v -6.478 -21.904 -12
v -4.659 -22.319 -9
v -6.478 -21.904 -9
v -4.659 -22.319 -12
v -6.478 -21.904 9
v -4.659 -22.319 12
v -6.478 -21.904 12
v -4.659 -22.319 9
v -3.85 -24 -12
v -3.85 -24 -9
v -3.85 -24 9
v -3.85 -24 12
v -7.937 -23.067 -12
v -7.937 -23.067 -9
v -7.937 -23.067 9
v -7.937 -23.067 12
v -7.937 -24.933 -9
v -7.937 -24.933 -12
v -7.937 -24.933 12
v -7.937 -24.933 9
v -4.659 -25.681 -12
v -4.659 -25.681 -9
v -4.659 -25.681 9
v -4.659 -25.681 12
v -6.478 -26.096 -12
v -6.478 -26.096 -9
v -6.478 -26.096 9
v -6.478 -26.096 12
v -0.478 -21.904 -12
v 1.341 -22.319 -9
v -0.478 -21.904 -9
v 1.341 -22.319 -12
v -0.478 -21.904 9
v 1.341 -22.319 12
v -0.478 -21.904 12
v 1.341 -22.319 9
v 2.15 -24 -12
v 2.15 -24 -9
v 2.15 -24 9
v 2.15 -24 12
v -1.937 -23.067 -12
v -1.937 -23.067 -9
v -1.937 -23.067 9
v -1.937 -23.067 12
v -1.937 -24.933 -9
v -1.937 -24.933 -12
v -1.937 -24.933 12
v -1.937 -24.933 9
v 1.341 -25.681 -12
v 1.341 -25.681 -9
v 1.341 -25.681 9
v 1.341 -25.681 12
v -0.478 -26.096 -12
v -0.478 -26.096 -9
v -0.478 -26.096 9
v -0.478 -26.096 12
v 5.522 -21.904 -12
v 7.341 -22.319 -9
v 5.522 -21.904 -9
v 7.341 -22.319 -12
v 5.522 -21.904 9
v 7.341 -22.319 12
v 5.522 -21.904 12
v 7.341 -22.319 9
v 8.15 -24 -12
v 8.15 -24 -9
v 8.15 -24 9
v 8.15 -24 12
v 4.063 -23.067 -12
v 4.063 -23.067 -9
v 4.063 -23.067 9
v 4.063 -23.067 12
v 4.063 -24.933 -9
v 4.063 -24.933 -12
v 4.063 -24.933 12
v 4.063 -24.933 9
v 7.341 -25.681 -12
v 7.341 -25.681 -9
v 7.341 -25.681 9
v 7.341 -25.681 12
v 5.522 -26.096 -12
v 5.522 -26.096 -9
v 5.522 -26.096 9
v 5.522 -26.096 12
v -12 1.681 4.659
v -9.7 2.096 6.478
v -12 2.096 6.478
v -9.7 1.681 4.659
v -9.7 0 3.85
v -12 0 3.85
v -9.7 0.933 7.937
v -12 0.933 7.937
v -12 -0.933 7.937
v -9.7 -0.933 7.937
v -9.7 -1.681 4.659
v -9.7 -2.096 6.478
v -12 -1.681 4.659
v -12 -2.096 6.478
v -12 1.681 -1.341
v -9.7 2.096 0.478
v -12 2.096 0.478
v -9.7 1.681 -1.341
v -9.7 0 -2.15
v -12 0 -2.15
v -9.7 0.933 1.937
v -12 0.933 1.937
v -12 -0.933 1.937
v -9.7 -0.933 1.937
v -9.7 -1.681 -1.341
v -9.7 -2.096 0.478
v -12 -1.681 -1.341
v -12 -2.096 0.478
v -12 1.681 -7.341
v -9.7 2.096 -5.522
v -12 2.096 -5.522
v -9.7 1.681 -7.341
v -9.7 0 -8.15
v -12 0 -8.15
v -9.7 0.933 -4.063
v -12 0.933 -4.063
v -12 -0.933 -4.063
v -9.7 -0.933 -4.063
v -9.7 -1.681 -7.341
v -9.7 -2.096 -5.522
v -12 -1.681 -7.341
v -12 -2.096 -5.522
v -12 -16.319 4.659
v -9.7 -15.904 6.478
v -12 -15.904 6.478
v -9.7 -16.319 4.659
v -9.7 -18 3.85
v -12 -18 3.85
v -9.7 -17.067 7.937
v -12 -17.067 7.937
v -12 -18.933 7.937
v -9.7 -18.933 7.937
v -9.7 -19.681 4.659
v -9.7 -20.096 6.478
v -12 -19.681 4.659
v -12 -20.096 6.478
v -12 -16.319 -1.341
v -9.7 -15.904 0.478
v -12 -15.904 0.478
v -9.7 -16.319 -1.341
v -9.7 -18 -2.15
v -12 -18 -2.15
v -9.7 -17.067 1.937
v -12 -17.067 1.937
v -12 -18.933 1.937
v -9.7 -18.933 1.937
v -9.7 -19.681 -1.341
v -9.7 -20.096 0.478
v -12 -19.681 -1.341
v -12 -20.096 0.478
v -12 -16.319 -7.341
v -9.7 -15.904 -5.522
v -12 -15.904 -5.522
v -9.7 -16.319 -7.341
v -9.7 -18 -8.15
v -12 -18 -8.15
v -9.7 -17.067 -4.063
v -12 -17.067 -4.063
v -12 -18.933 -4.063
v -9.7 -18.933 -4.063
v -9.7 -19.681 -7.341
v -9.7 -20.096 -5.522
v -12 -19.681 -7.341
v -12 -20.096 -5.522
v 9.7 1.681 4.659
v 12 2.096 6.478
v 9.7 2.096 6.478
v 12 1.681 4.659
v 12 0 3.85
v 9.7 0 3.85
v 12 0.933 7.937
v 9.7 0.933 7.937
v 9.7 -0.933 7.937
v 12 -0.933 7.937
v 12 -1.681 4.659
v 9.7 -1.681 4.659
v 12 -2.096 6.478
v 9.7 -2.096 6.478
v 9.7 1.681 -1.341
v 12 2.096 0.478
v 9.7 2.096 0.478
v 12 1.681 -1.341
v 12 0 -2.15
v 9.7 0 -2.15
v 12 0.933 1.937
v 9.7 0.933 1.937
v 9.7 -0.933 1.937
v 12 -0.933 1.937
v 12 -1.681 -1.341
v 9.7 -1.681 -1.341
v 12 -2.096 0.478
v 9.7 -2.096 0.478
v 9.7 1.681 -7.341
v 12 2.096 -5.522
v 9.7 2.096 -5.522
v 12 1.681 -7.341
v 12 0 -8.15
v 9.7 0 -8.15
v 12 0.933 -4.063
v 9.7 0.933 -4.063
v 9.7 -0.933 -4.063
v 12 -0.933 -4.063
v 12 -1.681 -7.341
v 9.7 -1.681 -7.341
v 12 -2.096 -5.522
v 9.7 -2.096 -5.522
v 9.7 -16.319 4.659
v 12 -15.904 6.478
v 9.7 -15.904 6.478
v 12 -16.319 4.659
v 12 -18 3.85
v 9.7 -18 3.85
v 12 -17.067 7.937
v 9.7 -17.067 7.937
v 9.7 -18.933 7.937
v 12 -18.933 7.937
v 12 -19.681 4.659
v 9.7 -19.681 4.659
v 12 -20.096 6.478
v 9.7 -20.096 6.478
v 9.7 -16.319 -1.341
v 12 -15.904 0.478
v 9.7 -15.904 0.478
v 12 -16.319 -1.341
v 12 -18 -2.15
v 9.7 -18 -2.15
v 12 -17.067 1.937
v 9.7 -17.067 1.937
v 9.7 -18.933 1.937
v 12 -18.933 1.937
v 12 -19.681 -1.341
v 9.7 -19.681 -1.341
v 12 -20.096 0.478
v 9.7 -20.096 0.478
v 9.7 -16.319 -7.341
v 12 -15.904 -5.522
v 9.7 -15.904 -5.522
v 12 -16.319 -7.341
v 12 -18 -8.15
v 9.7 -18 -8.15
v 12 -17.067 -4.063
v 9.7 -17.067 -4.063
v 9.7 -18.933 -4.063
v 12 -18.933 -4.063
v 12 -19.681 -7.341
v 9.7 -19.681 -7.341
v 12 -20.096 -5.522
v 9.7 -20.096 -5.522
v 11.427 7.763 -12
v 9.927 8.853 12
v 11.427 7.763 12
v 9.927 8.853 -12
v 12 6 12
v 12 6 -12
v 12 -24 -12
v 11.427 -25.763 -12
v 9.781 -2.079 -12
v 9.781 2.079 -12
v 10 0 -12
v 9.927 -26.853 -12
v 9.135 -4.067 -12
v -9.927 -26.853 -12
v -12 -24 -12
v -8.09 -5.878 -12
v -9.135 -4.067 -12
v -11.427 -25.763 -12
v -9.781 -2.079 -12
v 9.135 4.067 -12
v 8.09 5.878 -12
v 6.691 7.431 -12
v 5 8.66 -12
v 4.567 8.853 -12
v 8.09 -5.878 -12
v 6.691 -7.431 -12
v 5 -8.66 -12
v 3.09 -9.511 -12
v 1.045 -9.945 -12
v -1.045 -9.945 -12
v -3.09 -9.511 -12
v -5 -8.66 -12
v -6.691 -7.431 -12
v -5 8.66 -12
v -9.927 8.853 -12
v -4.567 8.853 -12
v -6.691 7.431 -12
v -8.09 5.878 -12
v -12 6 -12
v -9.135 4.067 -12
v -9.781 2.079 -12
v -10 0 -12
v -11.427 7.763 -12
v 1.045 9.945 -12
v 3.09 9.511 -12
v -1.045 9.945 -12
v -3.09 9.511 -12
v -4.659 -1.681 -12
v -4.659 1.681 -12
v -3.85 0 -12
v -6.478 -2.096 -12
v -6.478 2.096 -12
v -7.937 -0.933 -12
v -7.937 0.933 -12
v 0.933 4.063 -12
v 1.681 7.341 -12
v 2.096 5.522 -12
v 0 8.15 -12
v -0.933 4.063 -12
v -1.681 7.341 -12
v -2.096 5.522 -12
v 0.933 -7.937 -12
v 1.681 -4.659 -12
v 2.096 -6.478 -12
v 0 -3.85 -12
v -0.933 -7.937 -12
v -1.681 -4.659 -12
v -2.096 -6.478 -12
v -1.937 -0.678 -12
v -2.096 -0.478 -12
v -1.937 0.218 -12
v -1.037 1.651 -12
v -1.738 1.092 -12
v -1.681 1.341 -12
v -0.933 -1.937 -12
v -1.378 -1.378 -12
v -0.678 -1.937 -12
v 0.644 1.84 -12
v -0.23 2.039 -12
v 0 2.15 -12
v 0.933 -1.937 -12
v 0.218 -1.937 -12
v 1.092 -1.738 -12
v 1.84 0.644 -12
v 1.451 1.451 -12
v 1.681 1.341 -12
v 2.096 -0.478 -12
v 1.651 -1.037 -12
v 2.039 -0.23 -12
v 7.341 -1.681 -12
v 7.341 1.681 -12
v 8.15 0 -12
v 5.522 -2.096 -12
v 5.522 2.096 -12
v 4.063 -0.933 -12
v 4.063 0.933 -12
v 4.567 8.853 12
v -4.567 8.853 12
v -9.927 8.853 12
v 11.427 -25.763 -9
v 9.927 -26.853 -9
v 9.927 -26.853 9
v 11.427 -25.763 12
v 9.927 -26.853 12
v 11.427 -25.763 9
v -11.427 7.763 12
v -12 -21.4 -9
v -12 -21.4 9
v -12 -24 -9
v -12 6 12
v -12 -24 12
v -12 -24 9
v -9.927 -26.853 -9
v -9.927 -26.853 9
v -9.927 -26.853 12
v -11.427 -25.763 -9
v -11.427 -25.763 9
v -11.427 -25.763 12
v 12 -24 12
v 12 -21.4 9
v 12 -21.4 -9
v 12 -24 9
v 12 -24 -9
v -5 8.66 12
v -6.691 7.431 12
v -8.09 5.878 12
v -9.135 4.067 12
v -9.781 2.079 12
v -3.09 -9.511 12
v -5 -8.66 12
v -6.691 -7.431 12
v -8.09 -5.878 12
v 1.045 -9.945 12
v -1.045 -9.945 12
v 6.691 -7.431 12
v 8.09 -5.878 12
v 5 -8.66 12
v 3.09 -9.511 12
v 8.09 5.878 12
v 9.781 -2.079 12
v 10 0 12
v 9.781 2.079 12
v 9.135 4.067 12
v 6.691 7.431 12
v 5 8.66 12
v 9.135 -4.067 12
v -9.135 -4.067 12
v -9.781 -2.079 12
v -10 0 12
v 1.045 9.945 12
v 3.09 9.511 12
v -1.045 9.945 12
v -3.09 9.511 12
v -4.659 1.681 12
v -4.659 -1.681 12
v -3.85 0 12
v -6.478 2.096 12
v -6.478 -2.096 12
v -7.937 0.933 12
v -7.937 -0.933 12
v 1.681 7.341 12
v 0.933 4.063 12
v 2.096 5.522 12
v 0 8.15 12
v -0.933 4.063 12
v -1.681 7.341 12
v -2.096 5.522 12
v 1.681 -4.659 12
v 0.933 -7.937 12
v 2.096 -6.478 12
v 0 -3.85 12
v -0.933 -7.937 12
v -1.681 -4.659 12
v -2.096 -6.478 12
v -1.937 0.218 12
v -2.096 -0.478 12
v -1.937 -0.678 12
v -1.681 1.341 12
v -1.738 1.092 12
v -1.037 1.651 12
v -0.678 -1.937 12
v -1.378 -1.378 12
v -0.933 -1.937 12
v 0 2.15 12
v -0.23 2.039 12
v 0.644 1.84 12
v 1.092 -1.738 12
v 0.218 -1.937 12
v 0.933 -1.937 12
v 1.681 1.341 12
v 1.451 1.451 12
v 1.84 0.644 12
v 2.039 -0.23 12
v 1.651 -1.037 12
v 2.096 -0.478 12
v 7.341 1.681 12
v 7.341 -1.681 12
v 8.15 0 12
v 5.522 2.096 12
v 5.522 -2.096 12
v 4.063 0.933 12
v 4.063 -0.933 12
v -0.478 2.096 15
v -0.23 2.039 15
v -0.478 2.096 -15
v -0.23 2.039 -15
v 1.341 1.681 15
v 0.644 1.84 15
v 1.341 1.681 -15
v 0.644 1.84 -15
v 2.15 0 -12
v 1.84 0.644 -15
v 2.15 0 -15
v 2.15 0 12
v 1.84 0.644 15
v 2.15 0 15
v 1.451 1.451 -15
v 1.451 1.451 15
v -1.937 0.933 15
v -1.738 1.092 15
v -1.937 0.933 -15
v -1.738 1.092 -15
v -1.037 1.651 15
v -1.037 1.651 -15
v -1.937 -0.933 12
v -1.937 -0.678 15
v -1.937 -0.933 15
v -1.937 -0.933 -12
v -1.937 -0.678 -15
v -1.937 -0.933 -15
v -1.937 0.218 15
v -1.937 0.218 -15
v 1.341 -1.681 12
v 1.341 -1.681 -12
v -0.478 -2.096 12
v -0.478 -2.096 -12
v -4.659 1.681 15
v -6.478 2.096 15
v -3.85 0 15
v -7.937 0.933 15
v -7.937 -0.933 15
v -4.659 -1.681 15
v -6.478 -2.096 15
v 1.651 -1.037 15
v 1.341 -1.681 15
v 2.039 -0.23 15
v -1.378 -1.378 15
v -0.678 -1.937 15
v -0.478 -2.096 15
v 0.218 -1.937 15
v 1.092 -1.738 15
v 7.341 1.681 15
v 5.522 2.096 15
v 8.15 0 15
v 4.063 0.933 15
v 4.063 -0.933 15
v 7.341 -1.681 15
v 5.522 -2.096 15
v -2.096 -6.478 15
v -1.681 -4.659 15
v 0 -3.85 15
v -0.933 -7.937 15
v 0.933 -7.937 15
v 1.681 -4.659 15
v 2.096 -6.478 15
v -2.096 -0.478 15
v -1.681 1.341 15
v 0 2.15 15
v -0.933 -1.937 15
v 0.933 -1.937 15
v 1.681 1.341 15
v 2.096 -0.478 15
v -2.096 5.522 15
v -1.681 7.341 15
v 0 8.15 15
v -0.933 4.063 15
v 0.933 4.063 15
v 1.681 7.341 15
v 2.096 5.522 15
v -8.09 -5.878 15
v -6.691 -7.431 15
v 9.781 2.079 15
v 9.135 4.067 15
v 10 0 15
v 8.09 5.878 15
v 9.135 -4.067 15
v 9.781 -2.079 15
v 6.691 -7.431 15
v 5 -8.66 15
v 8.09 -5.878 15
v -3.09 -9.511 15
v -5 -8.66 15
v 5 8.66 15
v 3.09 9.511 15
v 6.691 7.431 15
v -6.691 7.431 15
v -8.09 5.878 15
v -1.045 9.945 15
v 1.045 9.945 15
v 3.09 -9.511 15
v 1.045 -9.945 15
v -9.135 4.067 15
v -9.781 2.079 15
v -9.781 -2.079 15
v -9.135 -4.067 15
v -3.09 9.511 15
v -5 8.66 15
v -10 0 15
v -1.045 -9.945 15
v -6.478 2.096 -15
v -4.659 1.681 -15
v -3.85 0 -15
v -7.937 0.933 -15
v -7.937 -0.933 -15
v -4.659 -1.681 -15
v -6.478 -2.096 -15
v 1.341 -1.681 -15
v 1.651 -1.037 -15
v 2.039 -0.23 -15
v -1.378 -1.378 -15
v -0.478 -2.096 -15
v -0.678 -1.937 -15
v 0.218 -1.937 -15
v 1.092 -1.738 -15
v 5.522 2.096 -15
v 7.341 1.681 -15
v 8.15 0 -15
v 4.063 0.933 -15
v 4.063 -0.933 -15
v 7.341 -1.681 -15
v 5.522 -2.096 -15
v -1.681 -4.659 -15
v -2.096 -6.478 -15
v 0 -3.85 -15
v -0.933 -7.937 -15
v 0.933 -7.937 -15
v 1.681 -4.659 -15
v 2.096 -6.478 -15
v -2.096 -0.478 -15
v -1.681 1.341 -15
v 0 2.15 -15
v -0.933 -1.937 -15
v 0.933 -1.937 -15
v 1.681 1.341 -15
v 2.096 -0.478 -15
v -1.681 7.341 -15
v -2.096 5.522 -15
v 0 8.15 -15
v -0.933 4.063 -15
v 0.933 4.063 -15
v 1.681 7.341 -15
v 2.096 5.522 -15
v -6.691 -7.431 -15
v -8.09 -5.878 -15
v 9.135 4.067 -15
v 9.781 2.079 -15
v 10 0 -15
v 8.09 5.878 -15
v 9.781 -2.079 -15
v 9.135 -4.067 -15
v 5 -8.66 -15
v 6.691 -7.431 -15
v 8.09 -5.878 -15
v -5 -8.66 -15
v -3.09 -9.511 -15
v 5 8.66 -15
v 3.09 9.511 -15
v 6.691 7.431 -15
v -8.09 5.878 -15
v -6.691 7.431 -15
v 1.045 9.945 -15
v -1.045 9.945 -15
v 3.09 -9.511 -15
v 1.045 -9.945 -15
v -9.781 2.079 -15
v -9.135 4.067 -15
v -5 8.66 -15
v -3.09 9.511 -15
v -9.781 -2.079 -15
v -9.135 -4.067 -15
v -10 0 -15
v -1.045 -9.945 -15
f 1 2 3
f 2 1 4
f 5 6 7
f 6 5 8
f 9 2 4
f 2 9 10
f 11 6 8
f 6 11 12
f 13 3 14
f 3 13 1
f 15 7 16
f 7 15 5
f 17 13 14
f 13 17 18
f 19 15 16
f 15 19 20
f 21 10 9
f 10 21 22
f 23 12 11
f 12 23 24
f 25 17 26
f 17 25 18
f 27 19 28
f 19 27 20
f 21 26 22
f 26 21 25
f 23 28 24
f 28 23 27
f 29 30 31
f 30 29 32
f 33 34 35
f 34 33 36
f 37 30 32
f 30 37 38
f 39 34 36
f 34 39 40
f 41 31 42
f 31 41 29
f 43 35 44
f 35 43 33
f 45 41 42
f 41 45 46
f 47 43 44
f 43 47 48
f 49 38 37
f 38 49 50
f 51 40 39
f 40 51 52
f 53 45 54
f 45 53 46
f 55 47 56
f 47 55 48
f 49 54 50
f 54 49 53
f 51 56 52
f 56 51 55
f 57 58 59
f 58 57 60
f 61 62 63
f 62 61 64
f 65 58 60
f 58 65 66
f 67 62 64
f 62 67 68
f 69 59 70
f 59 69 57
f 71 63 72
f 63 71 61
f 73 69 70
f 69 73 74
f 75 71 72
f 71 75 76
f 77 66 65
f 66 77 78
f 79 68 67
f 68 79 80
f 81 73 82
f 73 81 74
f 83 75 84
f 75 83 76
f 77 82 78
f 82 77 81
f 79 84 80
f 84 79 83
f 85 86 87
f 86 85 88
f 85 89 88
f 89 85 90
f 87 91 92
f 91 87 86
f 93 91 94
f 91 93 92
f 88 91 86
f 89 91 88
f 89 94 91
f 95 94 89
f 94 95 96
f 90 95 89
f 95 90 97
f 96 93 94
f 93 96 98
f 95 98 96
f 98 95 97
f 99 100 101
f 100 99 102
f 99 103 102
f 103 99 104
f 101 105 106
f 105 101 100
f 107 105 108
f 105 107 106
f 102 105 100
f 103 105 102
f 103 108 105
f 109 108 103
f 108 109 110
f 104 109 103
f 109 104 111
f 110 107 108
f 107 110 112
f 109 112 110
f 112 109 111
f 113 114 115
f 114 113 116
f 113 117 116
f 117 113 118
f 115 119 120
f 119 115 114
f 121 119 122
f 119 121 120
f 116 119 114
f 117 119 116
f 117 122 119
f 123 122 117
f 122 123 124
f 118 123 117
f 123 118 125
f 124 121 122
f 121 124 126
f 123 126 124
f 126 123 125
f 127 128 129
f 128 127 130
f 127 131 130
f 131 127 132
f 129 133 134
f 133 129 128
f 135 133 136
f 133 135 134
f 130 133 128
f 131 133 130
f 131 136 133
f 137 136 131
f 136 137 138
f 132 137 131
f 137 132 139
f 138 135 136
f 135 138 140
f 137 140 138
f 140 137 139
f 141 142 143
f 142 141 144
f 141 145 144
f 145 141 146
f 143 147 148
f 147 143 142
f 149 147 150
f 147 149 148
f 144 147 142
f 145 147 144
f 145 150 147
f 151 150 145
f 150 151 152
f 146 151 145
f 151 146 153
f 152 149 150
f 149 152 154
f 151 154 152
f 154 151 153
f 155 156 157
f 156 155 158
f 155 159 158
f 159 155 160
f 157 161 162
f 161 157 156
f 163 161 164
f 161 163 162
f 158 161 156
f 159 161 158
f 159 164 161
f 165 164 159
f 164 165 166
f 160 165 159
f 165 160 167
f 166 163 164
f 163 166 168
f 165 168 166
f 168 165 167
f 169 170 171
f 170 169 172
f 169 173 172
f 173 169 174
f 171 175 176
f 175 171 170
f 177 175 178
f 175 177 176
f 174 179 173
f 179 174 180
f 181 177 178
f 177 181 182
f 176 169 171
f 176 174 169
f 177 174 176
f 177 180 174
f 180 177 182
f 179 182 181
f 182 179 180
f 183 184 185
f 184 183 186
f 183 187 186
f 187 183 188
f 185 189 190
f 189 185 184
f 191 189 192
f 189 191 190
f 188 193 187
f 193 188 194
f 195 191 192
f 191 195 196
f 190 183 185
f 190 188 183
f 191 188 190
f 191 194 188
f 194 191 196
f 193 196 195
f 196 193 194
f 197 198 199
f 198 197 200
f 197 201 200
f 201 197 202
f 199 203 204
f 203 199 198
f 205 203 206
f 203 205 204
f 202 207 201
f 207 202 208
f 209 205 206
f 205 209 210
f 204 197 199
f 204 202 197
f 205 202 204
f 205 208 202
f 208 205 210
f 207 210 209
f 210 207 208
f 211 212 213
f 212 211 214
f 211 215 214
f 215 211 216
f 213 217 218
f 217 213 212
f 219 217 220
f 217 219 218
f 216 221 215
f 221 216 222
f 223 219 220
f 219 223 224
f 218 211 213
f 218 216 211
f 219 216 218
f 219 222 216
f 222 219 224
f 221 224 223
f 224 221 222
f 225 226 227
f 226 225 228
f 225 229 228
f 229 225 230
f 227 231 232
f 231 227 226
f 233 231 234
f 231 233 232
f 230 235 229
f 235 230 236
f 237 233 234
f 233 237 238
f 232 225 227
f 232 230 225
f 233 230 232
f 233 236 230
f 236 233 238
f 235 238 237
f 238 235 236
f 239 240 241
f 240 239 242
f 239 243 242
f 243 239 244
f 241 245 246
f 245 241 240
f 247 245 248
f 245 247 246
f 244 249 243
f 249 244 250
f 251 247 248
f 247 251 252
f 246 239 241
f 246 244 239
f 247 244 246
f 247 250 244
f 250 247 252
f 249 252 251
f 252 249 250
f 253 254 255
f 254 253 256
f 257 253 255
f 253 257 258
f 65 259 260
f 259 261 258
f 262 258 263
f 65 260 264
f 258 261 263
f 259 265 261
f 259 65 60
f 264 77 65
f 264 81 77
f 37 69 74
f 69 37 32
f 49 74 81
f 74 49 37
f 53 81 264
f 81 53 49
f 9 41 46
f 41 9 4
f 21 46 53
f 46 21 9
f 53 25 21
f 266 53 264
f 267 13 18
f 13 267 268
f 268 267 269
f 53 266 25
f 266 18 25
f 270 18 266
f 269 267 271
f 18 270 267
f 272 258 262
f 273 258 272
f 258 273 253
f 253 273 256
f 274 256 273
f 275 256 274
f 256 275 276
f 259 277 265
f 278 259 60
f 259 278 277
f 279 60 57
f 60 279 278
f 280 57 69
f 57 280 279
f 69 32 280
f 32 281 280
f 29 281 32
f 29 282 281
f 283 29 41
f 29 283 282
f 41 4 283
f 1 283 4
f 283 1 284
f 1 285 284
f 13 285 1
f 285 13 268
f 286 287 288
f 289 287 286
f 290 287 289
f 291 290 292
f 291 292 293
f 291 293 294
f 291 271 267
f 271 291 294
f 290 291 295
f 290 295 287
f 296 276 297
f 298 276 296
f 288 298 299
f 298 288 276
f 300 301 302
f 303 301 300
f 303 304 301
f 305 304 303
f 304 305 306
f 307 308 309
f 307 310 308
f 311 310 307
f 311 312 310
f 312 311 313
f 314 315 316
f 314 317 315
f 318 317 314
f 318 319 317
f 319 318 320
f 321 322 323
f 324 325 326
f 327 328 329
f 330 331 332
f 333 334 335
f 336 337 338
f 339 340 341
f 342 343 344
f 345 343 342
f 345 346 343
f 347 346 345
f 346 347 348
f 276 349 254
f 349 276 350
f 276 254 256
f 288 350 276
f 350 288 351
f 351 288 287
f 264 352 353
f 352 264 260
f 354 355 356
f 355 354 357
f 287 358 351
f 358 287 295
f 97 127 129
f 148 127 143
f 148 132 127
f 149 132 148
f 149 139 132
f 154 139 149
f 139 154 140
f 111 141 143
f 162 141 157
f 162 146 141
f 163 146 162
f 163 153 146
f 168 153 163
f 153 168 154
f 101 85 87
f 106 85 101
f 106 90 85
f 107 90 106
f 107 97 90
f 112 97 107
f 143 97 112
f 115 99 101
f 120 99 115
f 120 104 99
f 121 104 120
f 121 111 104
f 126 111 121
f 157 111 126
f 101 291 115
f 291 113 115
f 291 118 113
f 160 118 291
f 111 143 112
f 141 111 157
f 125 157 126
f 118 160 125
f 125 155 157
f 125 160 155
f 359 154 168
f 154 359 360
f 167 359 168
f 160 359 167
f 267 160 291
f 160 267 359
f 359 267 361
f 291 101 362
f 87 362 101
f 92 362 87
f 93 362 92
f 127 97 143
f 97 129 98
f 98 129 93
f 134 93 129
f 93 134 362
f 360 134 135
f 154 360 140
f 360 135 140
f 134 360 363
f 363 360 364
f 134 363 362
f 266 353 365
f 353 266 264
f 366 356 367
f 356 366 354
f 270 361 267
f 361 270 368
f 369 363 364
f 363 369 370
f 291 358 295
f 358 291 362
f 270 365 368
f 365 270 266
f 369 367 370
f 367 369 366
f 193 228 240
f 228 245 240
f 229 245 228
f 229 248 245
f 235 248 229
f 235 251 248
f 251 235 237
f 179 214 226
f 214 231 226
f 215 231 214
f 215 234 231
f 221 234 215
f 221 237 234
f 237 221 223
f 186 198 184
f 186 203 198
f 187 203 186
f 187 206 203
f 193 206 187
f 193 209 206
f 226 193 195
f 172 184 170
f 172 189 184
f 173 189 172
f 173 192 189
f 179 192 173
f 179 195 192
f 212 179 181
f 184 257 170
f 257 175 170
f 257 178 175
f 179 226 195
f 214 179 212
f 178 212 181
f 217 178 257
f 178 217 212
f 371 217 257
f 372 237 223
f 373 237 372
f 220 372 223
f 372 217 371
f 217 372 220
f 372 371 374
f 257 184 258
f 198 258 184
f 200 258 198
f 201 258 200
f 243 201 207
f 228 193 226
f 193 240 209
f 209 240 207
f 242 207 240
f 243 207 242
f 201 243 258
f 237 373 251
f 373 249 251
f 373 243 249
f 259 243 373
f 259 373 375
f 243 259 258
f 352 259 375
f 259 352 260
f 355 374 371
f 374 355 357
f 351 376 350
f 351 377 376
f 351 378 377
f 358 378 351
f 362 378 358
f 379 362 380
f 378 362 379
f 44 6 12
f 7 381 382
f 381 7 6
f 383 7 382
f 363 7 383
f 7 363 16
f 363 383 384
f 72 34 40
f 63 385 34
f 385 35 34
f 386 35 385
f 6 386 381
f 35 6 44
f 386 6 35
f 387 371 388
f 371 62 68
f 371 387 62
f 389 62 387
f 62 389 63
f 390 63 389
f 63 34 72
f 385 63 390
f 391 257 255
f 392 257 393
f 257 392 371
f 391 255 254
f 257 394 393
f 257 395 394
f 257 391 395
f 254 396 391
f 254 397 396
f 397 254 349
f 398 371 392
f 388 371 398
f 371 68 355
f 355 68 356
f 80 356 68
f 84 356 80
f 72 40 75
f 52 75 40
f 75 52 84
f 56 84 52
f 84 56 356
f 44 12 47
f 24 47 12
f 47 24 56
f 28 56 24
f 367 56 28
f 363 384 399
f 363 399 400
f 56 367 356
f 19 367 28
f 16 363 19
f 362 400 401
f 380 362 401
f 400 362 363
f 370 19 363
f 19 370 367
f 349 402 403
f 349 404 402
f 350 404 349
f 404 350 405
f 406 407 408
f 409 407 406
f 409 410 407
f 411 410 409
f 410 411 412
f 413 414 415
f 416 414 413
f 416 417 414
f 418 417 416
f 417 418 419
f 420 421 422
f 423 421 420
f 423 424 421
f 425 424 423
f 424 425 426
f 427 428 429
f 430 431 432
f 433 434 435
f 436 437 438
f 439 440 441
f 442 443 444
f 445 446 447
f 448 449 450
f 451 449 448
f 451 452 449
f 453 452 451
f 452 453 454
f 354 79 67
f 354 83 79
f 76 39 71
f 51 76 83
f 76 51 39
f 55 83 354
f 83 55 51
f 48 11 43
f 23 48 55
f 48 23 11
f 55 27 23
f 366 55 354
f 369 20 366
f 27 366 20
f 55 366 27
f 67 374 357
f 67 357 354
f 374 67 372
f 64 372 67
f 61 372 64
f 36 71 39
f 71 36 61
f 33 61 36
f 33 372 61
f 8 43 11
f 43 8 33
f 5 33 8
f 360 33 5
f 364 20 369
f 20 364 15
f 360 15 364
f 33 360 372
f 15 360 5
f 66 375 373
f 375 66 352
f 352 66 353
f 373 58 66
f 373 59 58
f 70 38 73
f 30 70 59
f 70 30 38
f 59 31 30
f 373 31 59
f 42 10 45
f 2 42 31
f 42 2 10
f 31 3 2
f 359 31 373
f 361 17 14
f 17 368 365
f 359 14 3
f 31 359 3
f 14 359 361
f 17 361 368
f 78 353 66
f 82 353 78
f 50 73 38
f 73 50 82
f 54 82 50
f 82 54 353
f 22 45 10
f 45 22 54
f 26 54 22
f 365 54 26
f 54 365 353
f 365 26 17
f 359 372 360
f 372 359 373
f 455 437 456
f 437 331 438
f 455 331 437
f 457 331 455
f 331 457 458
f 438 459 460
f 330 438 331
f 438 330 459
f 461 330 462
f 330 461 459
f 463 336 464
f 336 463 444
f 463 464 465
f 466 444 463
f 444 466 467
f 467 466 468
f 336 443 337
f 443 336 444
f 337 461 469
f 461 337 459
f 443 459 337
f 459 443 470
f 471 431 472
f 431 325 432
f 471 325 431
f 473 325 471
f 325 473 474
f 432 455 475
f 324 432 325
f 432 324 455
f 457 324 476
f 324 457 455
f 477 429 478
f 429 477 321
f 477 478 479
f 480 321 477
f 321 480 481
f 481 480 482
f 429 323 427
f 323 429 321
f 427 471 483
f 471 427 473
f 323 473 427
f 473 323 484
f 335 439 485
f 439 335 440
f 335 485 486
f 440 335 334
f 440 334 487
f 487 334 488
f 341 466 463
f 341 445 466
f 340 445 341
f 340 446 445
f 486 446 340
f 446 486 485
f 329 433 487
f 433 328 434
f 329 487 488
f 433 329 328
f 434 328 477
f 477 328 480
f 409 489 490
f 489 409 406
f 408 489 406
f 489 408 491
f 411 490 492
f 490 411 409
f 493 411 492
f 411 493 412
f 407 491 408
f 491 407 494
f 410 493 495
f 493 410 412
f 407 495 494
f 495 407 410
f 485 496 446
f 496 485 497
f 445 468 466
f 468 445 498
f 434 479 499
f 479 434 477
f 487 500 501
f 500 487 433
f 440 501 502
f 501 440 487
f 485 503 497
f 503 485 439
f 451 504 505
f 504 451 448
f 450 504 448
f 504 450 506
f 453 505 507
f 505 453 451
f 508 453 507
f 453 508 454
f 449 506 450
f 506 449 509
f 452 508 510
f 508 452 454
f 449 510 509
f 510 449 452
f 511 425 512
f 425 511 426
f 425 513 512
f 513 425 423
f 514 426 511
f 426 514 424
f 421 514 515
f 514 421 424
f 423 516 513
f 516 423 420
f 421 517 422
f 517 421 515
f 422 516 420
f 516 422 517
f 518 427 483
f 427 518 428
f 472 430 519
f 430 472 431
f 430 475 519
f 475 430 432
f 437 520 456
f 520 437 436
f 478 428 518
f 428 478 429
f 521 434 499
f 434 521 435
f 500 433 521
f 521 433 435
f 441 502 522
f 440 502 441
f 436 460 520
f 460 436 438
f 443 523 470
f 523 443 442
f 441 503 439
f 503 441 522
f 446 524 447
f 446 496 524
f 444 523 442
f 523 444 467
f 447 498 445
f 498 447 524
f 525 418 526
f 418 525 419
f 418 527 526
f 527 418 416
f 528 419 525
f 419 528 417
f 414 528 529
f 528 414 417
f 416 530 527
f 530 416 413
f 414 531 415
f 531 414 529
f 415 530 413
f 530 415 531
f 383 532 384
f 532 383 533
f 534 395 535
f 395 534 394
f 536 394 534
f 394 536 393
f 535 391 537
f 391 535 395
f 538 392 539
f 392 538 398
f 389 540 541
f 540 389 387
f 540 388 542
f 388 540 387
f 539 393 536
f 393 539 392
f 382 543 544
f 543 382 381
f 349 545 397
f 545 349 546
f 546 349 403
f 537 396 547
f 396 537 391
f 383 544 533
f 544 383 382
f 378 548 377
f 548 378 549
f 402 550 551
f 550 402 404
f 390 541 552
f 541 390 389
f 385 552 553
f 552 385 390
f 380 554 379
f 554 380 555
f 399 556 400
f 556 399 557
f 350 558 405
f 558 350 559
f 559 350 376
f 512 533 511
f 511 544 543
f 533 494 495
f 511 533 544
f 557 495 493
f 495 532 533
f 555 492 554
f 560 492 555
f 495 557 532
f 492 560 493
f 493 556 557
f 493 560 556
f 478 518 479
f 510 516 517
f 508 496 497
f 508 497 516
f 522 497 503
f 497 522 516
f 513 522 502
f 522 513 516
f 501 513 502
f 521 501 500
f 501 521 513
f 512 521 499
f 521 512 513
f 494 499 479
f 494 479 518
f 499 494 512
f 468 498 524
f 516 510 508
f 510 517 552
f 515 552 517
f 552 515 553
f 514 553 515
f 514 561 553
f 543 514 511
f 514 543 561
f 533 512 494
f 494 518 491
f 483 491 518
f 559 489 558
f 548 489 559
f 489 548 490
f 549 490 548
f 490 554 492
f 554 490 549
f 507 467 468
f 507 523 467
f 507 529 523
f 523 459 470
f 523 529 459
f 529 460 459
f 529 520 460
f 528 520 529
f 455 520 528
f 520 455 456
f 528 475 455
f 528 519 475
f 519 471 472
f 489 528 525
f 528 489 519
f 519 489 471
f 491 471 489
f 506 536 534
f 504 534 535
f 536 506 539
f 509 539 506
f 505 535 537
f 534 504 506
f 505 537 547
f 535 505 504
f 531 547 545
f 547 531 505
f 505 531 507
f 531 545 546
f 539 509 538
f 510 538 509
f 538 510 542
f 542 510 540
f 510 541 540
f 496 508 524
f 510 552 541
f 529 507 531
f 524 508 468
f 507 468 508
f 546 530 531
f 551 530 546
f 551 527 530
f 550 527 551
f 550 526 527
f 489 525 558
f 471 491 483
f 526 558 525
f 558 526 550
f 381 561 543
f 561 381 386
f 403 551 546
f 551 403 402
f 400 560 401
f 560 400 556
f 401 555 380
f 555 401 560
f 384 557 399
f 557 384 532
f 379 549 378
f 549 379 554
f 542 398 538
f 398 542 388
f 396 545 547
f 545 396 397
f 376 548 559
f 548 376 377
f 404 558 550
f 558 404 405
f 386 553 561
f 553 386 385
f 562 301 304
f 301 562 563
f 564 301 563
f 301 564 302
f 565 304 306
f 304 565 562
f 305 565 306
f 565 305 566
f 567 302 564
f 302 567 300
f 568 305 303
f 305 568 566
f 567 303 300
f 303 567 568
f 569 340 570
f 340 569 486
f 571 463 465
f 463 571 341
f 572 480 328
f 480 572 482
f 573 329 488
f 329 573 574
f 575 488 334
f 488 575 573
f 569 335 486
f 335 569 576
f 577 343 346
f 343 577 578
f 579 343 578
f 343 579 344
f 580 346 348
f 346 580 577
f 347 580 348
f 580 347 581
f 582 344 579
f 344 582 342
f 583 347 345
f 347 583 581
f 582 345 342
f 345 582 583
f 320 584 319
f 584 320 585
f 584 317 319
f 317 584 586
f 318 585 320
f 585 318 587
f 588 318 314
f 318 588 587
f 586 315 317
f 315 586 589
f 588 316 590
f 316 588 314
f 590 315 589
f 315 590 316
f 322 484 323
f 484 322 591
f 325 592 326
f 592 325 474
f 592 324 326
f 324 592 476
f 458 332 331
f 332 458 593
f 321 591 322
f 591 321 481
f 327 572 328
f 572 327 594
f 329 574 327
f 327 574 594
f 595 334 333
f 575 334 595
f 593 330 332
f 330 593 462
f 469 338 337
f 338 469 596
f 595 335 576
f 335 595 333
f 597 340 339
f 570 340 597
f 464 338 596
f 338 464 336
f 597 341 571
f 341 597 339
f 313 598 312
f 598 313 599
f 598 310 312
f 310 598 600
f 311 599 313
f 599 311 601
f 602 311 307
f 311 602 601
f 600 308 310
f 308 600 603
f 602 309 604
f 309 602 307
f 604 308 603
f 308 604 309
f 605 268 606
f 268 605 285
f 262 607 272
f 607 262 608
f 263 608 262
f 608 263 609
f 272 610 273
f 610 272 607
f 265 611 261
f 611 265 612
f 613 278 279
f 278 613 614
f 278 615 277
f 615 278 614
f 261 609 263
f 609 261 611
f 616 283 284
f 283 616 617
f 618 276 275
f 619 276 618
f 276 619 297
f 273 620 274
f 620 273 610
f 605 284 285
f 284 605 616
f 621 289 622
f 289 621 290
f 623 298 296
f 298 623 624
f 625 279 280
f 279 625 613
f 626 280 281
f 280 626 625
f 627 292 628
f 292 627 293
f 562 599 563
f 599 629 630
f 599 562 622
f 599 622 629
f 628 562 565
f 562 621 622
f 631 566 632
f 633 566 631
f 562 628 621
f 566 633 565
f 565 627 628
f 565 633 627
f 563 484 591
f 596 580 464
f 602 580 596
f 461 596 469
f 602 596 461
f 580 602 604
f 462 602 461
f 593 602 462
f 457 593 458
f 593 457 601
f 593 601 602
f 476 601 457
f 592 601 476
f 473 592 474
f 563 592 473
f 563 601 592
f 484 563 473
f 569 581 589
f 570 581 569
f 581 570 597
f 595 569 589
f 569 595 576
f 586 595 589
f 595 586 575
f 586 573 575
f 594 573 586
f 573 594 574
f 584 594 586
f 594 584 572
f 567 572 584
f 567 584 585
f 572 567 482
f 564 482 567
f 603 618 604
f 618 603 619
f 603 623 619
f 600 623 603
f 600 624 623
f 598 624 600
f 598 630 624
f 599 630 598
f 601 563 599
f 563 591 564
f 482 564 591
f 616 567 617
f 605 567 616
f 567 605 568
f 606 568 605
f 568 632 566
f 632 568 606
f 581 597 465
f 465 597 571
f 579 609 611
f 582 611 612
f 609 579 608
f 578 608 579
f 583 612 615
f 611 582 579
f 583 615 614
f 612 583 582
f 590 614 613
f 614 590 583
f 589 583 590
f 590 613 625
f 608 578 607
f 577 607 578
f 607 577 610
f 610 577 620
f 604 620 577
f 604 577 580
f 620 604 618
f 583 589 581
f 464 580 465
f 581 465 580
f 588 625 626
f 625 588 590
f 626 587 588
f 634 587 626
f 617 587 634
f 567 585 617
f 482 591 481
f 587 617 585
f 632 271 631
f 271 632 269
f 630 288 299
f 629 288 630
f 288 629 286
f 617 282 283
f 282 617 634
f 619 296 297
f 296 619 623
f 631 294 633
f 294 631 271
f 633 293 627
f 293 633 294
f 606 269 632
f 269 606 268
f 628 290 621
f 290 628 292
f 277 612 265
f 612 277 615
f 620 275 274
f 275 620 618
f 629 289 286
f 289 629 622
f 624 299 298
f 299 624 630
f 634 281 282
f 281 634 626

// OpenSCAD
// file: ../util/rounded.scad
// Do a rounded cube
module rounded(x=10, y=10, z=10, r=3, center=false) {
  if (center) {
    translate([-(x/2),-(y/2),0])
      rounded(x, y, z, r);
  } else {
    translate([r,r,0])
    minkowski() {
      cube([x-2*r,y-2*r,z/2]);
      cylinder(h=z/2, r=r);
    }
  }
}
// file: motor_values.scad
// Motor dimensions
MotorWidth = 24; 
MotorHeight = 36; 
MotorDepth = 24; 
MotorArmOffset = 9;
// file: ollo.scad
// Diameter of plastic ollo holes
OlloHoles = 4.3;

// Width of Ollo "real" plastic
OlloWidth = 3;

// Distance between two ollo holes
OlloSpacing = 6;

// Do an Ollo hole on the part
module olloHole(depth=2.2)
{
    //:BOM "Ollo rivet" 0.05 http://www.robotis-shop-en.com/?act=shop_en.goods_view&GS=1605
    translate([0,0,-0.1])
      cylinder(depth+0.2, OlloHoles/2, OlloHoles/2);
}

// Do 3 ollo holes
module threeOllo(depth=2.2)
{
  for (xy=[[-OlloSpacing,0],[0,0],[OlloSpacing,0]]) {
    translate([xy[0], xy[1], 0])
    olloHole(depth);
  }
}

// Do a servo arm holes
module servoArm(depth=2.2)
{
    threeOllo(depth);
    rotate([0,0,90])
      threeOllo(depth);
}
// file: arm.scad
include <ollo.scad>;

//:Model 
module arm(pulley=false) {
    //:BOM "Ollo pulley" 0.2 http://www.robotis-shop-en.com/?act=shop_en.goods_view&GS=1590
    c = pulley?[0.6,0.6,0.6]:[0.3,0.3,0.3];
    color(c) {
        difference() {
            cylinder(d=20, h=OlloWidth);
            servoArm(OlloWidth);
        }
    }
}

module pulley() {
    arm(true);
}

arm();
// file: motor.scad
include <ollo.scad>;
include <motor_values.scad>;
use <../util/rounded.scad>;

//:Model [0.4,0.45,0.4]
module motor(thickness=2.2) {
    //:BOM "XL-320 Servo" 21.9 http://www.robotis-shop-en.com/?act=shop_en.goods_view&GS=1611
    translate([0,-MotorArmOffset,-MotorDepth/2]) {
        color([0.25,0.25,0.25]) {
            difference() {
                rounded(MotorWidth,MotorHeight,MotorDepth,3,center=true);

                // Bottom
                translate([-MotorWidth/2-0.1,-MotorHeight/2-0.1,3])
                    cube([MotorWidth+0.2, 5.7, MotorDepth-6]);

                translate([0,-MotorHeight/2+3])
                    threeOllo(MotorDepth);

                // Motor shaft
                translate([0, MotorArmOffset])
                    olloHole(MotorDepth+5);

                // Side holes
                for (side=[-MotorWidth/2,MotorWidth/2-thickness]) {
                    translate([side,9,MotorDepth/2]) {
                        rotate([0,90,0]) {
                            threeOllo();
                            translate([0,-3*OlloSpacing,0])
                                threeOllo();
                        }
                    }
                }
            }
        }
    }
}

motor();
// main file
include <motor.scad>;
use <arm.scad>;

module motorArm(counterArm=true) {
    motor();
    translate([0,0,MotorDepth/2])
        arm();
    if (counterArm) {
        translate([0,0,-MotorDepth/2-OlloWidth]) {
            pulley();
        }
    }
}

motorArm();
